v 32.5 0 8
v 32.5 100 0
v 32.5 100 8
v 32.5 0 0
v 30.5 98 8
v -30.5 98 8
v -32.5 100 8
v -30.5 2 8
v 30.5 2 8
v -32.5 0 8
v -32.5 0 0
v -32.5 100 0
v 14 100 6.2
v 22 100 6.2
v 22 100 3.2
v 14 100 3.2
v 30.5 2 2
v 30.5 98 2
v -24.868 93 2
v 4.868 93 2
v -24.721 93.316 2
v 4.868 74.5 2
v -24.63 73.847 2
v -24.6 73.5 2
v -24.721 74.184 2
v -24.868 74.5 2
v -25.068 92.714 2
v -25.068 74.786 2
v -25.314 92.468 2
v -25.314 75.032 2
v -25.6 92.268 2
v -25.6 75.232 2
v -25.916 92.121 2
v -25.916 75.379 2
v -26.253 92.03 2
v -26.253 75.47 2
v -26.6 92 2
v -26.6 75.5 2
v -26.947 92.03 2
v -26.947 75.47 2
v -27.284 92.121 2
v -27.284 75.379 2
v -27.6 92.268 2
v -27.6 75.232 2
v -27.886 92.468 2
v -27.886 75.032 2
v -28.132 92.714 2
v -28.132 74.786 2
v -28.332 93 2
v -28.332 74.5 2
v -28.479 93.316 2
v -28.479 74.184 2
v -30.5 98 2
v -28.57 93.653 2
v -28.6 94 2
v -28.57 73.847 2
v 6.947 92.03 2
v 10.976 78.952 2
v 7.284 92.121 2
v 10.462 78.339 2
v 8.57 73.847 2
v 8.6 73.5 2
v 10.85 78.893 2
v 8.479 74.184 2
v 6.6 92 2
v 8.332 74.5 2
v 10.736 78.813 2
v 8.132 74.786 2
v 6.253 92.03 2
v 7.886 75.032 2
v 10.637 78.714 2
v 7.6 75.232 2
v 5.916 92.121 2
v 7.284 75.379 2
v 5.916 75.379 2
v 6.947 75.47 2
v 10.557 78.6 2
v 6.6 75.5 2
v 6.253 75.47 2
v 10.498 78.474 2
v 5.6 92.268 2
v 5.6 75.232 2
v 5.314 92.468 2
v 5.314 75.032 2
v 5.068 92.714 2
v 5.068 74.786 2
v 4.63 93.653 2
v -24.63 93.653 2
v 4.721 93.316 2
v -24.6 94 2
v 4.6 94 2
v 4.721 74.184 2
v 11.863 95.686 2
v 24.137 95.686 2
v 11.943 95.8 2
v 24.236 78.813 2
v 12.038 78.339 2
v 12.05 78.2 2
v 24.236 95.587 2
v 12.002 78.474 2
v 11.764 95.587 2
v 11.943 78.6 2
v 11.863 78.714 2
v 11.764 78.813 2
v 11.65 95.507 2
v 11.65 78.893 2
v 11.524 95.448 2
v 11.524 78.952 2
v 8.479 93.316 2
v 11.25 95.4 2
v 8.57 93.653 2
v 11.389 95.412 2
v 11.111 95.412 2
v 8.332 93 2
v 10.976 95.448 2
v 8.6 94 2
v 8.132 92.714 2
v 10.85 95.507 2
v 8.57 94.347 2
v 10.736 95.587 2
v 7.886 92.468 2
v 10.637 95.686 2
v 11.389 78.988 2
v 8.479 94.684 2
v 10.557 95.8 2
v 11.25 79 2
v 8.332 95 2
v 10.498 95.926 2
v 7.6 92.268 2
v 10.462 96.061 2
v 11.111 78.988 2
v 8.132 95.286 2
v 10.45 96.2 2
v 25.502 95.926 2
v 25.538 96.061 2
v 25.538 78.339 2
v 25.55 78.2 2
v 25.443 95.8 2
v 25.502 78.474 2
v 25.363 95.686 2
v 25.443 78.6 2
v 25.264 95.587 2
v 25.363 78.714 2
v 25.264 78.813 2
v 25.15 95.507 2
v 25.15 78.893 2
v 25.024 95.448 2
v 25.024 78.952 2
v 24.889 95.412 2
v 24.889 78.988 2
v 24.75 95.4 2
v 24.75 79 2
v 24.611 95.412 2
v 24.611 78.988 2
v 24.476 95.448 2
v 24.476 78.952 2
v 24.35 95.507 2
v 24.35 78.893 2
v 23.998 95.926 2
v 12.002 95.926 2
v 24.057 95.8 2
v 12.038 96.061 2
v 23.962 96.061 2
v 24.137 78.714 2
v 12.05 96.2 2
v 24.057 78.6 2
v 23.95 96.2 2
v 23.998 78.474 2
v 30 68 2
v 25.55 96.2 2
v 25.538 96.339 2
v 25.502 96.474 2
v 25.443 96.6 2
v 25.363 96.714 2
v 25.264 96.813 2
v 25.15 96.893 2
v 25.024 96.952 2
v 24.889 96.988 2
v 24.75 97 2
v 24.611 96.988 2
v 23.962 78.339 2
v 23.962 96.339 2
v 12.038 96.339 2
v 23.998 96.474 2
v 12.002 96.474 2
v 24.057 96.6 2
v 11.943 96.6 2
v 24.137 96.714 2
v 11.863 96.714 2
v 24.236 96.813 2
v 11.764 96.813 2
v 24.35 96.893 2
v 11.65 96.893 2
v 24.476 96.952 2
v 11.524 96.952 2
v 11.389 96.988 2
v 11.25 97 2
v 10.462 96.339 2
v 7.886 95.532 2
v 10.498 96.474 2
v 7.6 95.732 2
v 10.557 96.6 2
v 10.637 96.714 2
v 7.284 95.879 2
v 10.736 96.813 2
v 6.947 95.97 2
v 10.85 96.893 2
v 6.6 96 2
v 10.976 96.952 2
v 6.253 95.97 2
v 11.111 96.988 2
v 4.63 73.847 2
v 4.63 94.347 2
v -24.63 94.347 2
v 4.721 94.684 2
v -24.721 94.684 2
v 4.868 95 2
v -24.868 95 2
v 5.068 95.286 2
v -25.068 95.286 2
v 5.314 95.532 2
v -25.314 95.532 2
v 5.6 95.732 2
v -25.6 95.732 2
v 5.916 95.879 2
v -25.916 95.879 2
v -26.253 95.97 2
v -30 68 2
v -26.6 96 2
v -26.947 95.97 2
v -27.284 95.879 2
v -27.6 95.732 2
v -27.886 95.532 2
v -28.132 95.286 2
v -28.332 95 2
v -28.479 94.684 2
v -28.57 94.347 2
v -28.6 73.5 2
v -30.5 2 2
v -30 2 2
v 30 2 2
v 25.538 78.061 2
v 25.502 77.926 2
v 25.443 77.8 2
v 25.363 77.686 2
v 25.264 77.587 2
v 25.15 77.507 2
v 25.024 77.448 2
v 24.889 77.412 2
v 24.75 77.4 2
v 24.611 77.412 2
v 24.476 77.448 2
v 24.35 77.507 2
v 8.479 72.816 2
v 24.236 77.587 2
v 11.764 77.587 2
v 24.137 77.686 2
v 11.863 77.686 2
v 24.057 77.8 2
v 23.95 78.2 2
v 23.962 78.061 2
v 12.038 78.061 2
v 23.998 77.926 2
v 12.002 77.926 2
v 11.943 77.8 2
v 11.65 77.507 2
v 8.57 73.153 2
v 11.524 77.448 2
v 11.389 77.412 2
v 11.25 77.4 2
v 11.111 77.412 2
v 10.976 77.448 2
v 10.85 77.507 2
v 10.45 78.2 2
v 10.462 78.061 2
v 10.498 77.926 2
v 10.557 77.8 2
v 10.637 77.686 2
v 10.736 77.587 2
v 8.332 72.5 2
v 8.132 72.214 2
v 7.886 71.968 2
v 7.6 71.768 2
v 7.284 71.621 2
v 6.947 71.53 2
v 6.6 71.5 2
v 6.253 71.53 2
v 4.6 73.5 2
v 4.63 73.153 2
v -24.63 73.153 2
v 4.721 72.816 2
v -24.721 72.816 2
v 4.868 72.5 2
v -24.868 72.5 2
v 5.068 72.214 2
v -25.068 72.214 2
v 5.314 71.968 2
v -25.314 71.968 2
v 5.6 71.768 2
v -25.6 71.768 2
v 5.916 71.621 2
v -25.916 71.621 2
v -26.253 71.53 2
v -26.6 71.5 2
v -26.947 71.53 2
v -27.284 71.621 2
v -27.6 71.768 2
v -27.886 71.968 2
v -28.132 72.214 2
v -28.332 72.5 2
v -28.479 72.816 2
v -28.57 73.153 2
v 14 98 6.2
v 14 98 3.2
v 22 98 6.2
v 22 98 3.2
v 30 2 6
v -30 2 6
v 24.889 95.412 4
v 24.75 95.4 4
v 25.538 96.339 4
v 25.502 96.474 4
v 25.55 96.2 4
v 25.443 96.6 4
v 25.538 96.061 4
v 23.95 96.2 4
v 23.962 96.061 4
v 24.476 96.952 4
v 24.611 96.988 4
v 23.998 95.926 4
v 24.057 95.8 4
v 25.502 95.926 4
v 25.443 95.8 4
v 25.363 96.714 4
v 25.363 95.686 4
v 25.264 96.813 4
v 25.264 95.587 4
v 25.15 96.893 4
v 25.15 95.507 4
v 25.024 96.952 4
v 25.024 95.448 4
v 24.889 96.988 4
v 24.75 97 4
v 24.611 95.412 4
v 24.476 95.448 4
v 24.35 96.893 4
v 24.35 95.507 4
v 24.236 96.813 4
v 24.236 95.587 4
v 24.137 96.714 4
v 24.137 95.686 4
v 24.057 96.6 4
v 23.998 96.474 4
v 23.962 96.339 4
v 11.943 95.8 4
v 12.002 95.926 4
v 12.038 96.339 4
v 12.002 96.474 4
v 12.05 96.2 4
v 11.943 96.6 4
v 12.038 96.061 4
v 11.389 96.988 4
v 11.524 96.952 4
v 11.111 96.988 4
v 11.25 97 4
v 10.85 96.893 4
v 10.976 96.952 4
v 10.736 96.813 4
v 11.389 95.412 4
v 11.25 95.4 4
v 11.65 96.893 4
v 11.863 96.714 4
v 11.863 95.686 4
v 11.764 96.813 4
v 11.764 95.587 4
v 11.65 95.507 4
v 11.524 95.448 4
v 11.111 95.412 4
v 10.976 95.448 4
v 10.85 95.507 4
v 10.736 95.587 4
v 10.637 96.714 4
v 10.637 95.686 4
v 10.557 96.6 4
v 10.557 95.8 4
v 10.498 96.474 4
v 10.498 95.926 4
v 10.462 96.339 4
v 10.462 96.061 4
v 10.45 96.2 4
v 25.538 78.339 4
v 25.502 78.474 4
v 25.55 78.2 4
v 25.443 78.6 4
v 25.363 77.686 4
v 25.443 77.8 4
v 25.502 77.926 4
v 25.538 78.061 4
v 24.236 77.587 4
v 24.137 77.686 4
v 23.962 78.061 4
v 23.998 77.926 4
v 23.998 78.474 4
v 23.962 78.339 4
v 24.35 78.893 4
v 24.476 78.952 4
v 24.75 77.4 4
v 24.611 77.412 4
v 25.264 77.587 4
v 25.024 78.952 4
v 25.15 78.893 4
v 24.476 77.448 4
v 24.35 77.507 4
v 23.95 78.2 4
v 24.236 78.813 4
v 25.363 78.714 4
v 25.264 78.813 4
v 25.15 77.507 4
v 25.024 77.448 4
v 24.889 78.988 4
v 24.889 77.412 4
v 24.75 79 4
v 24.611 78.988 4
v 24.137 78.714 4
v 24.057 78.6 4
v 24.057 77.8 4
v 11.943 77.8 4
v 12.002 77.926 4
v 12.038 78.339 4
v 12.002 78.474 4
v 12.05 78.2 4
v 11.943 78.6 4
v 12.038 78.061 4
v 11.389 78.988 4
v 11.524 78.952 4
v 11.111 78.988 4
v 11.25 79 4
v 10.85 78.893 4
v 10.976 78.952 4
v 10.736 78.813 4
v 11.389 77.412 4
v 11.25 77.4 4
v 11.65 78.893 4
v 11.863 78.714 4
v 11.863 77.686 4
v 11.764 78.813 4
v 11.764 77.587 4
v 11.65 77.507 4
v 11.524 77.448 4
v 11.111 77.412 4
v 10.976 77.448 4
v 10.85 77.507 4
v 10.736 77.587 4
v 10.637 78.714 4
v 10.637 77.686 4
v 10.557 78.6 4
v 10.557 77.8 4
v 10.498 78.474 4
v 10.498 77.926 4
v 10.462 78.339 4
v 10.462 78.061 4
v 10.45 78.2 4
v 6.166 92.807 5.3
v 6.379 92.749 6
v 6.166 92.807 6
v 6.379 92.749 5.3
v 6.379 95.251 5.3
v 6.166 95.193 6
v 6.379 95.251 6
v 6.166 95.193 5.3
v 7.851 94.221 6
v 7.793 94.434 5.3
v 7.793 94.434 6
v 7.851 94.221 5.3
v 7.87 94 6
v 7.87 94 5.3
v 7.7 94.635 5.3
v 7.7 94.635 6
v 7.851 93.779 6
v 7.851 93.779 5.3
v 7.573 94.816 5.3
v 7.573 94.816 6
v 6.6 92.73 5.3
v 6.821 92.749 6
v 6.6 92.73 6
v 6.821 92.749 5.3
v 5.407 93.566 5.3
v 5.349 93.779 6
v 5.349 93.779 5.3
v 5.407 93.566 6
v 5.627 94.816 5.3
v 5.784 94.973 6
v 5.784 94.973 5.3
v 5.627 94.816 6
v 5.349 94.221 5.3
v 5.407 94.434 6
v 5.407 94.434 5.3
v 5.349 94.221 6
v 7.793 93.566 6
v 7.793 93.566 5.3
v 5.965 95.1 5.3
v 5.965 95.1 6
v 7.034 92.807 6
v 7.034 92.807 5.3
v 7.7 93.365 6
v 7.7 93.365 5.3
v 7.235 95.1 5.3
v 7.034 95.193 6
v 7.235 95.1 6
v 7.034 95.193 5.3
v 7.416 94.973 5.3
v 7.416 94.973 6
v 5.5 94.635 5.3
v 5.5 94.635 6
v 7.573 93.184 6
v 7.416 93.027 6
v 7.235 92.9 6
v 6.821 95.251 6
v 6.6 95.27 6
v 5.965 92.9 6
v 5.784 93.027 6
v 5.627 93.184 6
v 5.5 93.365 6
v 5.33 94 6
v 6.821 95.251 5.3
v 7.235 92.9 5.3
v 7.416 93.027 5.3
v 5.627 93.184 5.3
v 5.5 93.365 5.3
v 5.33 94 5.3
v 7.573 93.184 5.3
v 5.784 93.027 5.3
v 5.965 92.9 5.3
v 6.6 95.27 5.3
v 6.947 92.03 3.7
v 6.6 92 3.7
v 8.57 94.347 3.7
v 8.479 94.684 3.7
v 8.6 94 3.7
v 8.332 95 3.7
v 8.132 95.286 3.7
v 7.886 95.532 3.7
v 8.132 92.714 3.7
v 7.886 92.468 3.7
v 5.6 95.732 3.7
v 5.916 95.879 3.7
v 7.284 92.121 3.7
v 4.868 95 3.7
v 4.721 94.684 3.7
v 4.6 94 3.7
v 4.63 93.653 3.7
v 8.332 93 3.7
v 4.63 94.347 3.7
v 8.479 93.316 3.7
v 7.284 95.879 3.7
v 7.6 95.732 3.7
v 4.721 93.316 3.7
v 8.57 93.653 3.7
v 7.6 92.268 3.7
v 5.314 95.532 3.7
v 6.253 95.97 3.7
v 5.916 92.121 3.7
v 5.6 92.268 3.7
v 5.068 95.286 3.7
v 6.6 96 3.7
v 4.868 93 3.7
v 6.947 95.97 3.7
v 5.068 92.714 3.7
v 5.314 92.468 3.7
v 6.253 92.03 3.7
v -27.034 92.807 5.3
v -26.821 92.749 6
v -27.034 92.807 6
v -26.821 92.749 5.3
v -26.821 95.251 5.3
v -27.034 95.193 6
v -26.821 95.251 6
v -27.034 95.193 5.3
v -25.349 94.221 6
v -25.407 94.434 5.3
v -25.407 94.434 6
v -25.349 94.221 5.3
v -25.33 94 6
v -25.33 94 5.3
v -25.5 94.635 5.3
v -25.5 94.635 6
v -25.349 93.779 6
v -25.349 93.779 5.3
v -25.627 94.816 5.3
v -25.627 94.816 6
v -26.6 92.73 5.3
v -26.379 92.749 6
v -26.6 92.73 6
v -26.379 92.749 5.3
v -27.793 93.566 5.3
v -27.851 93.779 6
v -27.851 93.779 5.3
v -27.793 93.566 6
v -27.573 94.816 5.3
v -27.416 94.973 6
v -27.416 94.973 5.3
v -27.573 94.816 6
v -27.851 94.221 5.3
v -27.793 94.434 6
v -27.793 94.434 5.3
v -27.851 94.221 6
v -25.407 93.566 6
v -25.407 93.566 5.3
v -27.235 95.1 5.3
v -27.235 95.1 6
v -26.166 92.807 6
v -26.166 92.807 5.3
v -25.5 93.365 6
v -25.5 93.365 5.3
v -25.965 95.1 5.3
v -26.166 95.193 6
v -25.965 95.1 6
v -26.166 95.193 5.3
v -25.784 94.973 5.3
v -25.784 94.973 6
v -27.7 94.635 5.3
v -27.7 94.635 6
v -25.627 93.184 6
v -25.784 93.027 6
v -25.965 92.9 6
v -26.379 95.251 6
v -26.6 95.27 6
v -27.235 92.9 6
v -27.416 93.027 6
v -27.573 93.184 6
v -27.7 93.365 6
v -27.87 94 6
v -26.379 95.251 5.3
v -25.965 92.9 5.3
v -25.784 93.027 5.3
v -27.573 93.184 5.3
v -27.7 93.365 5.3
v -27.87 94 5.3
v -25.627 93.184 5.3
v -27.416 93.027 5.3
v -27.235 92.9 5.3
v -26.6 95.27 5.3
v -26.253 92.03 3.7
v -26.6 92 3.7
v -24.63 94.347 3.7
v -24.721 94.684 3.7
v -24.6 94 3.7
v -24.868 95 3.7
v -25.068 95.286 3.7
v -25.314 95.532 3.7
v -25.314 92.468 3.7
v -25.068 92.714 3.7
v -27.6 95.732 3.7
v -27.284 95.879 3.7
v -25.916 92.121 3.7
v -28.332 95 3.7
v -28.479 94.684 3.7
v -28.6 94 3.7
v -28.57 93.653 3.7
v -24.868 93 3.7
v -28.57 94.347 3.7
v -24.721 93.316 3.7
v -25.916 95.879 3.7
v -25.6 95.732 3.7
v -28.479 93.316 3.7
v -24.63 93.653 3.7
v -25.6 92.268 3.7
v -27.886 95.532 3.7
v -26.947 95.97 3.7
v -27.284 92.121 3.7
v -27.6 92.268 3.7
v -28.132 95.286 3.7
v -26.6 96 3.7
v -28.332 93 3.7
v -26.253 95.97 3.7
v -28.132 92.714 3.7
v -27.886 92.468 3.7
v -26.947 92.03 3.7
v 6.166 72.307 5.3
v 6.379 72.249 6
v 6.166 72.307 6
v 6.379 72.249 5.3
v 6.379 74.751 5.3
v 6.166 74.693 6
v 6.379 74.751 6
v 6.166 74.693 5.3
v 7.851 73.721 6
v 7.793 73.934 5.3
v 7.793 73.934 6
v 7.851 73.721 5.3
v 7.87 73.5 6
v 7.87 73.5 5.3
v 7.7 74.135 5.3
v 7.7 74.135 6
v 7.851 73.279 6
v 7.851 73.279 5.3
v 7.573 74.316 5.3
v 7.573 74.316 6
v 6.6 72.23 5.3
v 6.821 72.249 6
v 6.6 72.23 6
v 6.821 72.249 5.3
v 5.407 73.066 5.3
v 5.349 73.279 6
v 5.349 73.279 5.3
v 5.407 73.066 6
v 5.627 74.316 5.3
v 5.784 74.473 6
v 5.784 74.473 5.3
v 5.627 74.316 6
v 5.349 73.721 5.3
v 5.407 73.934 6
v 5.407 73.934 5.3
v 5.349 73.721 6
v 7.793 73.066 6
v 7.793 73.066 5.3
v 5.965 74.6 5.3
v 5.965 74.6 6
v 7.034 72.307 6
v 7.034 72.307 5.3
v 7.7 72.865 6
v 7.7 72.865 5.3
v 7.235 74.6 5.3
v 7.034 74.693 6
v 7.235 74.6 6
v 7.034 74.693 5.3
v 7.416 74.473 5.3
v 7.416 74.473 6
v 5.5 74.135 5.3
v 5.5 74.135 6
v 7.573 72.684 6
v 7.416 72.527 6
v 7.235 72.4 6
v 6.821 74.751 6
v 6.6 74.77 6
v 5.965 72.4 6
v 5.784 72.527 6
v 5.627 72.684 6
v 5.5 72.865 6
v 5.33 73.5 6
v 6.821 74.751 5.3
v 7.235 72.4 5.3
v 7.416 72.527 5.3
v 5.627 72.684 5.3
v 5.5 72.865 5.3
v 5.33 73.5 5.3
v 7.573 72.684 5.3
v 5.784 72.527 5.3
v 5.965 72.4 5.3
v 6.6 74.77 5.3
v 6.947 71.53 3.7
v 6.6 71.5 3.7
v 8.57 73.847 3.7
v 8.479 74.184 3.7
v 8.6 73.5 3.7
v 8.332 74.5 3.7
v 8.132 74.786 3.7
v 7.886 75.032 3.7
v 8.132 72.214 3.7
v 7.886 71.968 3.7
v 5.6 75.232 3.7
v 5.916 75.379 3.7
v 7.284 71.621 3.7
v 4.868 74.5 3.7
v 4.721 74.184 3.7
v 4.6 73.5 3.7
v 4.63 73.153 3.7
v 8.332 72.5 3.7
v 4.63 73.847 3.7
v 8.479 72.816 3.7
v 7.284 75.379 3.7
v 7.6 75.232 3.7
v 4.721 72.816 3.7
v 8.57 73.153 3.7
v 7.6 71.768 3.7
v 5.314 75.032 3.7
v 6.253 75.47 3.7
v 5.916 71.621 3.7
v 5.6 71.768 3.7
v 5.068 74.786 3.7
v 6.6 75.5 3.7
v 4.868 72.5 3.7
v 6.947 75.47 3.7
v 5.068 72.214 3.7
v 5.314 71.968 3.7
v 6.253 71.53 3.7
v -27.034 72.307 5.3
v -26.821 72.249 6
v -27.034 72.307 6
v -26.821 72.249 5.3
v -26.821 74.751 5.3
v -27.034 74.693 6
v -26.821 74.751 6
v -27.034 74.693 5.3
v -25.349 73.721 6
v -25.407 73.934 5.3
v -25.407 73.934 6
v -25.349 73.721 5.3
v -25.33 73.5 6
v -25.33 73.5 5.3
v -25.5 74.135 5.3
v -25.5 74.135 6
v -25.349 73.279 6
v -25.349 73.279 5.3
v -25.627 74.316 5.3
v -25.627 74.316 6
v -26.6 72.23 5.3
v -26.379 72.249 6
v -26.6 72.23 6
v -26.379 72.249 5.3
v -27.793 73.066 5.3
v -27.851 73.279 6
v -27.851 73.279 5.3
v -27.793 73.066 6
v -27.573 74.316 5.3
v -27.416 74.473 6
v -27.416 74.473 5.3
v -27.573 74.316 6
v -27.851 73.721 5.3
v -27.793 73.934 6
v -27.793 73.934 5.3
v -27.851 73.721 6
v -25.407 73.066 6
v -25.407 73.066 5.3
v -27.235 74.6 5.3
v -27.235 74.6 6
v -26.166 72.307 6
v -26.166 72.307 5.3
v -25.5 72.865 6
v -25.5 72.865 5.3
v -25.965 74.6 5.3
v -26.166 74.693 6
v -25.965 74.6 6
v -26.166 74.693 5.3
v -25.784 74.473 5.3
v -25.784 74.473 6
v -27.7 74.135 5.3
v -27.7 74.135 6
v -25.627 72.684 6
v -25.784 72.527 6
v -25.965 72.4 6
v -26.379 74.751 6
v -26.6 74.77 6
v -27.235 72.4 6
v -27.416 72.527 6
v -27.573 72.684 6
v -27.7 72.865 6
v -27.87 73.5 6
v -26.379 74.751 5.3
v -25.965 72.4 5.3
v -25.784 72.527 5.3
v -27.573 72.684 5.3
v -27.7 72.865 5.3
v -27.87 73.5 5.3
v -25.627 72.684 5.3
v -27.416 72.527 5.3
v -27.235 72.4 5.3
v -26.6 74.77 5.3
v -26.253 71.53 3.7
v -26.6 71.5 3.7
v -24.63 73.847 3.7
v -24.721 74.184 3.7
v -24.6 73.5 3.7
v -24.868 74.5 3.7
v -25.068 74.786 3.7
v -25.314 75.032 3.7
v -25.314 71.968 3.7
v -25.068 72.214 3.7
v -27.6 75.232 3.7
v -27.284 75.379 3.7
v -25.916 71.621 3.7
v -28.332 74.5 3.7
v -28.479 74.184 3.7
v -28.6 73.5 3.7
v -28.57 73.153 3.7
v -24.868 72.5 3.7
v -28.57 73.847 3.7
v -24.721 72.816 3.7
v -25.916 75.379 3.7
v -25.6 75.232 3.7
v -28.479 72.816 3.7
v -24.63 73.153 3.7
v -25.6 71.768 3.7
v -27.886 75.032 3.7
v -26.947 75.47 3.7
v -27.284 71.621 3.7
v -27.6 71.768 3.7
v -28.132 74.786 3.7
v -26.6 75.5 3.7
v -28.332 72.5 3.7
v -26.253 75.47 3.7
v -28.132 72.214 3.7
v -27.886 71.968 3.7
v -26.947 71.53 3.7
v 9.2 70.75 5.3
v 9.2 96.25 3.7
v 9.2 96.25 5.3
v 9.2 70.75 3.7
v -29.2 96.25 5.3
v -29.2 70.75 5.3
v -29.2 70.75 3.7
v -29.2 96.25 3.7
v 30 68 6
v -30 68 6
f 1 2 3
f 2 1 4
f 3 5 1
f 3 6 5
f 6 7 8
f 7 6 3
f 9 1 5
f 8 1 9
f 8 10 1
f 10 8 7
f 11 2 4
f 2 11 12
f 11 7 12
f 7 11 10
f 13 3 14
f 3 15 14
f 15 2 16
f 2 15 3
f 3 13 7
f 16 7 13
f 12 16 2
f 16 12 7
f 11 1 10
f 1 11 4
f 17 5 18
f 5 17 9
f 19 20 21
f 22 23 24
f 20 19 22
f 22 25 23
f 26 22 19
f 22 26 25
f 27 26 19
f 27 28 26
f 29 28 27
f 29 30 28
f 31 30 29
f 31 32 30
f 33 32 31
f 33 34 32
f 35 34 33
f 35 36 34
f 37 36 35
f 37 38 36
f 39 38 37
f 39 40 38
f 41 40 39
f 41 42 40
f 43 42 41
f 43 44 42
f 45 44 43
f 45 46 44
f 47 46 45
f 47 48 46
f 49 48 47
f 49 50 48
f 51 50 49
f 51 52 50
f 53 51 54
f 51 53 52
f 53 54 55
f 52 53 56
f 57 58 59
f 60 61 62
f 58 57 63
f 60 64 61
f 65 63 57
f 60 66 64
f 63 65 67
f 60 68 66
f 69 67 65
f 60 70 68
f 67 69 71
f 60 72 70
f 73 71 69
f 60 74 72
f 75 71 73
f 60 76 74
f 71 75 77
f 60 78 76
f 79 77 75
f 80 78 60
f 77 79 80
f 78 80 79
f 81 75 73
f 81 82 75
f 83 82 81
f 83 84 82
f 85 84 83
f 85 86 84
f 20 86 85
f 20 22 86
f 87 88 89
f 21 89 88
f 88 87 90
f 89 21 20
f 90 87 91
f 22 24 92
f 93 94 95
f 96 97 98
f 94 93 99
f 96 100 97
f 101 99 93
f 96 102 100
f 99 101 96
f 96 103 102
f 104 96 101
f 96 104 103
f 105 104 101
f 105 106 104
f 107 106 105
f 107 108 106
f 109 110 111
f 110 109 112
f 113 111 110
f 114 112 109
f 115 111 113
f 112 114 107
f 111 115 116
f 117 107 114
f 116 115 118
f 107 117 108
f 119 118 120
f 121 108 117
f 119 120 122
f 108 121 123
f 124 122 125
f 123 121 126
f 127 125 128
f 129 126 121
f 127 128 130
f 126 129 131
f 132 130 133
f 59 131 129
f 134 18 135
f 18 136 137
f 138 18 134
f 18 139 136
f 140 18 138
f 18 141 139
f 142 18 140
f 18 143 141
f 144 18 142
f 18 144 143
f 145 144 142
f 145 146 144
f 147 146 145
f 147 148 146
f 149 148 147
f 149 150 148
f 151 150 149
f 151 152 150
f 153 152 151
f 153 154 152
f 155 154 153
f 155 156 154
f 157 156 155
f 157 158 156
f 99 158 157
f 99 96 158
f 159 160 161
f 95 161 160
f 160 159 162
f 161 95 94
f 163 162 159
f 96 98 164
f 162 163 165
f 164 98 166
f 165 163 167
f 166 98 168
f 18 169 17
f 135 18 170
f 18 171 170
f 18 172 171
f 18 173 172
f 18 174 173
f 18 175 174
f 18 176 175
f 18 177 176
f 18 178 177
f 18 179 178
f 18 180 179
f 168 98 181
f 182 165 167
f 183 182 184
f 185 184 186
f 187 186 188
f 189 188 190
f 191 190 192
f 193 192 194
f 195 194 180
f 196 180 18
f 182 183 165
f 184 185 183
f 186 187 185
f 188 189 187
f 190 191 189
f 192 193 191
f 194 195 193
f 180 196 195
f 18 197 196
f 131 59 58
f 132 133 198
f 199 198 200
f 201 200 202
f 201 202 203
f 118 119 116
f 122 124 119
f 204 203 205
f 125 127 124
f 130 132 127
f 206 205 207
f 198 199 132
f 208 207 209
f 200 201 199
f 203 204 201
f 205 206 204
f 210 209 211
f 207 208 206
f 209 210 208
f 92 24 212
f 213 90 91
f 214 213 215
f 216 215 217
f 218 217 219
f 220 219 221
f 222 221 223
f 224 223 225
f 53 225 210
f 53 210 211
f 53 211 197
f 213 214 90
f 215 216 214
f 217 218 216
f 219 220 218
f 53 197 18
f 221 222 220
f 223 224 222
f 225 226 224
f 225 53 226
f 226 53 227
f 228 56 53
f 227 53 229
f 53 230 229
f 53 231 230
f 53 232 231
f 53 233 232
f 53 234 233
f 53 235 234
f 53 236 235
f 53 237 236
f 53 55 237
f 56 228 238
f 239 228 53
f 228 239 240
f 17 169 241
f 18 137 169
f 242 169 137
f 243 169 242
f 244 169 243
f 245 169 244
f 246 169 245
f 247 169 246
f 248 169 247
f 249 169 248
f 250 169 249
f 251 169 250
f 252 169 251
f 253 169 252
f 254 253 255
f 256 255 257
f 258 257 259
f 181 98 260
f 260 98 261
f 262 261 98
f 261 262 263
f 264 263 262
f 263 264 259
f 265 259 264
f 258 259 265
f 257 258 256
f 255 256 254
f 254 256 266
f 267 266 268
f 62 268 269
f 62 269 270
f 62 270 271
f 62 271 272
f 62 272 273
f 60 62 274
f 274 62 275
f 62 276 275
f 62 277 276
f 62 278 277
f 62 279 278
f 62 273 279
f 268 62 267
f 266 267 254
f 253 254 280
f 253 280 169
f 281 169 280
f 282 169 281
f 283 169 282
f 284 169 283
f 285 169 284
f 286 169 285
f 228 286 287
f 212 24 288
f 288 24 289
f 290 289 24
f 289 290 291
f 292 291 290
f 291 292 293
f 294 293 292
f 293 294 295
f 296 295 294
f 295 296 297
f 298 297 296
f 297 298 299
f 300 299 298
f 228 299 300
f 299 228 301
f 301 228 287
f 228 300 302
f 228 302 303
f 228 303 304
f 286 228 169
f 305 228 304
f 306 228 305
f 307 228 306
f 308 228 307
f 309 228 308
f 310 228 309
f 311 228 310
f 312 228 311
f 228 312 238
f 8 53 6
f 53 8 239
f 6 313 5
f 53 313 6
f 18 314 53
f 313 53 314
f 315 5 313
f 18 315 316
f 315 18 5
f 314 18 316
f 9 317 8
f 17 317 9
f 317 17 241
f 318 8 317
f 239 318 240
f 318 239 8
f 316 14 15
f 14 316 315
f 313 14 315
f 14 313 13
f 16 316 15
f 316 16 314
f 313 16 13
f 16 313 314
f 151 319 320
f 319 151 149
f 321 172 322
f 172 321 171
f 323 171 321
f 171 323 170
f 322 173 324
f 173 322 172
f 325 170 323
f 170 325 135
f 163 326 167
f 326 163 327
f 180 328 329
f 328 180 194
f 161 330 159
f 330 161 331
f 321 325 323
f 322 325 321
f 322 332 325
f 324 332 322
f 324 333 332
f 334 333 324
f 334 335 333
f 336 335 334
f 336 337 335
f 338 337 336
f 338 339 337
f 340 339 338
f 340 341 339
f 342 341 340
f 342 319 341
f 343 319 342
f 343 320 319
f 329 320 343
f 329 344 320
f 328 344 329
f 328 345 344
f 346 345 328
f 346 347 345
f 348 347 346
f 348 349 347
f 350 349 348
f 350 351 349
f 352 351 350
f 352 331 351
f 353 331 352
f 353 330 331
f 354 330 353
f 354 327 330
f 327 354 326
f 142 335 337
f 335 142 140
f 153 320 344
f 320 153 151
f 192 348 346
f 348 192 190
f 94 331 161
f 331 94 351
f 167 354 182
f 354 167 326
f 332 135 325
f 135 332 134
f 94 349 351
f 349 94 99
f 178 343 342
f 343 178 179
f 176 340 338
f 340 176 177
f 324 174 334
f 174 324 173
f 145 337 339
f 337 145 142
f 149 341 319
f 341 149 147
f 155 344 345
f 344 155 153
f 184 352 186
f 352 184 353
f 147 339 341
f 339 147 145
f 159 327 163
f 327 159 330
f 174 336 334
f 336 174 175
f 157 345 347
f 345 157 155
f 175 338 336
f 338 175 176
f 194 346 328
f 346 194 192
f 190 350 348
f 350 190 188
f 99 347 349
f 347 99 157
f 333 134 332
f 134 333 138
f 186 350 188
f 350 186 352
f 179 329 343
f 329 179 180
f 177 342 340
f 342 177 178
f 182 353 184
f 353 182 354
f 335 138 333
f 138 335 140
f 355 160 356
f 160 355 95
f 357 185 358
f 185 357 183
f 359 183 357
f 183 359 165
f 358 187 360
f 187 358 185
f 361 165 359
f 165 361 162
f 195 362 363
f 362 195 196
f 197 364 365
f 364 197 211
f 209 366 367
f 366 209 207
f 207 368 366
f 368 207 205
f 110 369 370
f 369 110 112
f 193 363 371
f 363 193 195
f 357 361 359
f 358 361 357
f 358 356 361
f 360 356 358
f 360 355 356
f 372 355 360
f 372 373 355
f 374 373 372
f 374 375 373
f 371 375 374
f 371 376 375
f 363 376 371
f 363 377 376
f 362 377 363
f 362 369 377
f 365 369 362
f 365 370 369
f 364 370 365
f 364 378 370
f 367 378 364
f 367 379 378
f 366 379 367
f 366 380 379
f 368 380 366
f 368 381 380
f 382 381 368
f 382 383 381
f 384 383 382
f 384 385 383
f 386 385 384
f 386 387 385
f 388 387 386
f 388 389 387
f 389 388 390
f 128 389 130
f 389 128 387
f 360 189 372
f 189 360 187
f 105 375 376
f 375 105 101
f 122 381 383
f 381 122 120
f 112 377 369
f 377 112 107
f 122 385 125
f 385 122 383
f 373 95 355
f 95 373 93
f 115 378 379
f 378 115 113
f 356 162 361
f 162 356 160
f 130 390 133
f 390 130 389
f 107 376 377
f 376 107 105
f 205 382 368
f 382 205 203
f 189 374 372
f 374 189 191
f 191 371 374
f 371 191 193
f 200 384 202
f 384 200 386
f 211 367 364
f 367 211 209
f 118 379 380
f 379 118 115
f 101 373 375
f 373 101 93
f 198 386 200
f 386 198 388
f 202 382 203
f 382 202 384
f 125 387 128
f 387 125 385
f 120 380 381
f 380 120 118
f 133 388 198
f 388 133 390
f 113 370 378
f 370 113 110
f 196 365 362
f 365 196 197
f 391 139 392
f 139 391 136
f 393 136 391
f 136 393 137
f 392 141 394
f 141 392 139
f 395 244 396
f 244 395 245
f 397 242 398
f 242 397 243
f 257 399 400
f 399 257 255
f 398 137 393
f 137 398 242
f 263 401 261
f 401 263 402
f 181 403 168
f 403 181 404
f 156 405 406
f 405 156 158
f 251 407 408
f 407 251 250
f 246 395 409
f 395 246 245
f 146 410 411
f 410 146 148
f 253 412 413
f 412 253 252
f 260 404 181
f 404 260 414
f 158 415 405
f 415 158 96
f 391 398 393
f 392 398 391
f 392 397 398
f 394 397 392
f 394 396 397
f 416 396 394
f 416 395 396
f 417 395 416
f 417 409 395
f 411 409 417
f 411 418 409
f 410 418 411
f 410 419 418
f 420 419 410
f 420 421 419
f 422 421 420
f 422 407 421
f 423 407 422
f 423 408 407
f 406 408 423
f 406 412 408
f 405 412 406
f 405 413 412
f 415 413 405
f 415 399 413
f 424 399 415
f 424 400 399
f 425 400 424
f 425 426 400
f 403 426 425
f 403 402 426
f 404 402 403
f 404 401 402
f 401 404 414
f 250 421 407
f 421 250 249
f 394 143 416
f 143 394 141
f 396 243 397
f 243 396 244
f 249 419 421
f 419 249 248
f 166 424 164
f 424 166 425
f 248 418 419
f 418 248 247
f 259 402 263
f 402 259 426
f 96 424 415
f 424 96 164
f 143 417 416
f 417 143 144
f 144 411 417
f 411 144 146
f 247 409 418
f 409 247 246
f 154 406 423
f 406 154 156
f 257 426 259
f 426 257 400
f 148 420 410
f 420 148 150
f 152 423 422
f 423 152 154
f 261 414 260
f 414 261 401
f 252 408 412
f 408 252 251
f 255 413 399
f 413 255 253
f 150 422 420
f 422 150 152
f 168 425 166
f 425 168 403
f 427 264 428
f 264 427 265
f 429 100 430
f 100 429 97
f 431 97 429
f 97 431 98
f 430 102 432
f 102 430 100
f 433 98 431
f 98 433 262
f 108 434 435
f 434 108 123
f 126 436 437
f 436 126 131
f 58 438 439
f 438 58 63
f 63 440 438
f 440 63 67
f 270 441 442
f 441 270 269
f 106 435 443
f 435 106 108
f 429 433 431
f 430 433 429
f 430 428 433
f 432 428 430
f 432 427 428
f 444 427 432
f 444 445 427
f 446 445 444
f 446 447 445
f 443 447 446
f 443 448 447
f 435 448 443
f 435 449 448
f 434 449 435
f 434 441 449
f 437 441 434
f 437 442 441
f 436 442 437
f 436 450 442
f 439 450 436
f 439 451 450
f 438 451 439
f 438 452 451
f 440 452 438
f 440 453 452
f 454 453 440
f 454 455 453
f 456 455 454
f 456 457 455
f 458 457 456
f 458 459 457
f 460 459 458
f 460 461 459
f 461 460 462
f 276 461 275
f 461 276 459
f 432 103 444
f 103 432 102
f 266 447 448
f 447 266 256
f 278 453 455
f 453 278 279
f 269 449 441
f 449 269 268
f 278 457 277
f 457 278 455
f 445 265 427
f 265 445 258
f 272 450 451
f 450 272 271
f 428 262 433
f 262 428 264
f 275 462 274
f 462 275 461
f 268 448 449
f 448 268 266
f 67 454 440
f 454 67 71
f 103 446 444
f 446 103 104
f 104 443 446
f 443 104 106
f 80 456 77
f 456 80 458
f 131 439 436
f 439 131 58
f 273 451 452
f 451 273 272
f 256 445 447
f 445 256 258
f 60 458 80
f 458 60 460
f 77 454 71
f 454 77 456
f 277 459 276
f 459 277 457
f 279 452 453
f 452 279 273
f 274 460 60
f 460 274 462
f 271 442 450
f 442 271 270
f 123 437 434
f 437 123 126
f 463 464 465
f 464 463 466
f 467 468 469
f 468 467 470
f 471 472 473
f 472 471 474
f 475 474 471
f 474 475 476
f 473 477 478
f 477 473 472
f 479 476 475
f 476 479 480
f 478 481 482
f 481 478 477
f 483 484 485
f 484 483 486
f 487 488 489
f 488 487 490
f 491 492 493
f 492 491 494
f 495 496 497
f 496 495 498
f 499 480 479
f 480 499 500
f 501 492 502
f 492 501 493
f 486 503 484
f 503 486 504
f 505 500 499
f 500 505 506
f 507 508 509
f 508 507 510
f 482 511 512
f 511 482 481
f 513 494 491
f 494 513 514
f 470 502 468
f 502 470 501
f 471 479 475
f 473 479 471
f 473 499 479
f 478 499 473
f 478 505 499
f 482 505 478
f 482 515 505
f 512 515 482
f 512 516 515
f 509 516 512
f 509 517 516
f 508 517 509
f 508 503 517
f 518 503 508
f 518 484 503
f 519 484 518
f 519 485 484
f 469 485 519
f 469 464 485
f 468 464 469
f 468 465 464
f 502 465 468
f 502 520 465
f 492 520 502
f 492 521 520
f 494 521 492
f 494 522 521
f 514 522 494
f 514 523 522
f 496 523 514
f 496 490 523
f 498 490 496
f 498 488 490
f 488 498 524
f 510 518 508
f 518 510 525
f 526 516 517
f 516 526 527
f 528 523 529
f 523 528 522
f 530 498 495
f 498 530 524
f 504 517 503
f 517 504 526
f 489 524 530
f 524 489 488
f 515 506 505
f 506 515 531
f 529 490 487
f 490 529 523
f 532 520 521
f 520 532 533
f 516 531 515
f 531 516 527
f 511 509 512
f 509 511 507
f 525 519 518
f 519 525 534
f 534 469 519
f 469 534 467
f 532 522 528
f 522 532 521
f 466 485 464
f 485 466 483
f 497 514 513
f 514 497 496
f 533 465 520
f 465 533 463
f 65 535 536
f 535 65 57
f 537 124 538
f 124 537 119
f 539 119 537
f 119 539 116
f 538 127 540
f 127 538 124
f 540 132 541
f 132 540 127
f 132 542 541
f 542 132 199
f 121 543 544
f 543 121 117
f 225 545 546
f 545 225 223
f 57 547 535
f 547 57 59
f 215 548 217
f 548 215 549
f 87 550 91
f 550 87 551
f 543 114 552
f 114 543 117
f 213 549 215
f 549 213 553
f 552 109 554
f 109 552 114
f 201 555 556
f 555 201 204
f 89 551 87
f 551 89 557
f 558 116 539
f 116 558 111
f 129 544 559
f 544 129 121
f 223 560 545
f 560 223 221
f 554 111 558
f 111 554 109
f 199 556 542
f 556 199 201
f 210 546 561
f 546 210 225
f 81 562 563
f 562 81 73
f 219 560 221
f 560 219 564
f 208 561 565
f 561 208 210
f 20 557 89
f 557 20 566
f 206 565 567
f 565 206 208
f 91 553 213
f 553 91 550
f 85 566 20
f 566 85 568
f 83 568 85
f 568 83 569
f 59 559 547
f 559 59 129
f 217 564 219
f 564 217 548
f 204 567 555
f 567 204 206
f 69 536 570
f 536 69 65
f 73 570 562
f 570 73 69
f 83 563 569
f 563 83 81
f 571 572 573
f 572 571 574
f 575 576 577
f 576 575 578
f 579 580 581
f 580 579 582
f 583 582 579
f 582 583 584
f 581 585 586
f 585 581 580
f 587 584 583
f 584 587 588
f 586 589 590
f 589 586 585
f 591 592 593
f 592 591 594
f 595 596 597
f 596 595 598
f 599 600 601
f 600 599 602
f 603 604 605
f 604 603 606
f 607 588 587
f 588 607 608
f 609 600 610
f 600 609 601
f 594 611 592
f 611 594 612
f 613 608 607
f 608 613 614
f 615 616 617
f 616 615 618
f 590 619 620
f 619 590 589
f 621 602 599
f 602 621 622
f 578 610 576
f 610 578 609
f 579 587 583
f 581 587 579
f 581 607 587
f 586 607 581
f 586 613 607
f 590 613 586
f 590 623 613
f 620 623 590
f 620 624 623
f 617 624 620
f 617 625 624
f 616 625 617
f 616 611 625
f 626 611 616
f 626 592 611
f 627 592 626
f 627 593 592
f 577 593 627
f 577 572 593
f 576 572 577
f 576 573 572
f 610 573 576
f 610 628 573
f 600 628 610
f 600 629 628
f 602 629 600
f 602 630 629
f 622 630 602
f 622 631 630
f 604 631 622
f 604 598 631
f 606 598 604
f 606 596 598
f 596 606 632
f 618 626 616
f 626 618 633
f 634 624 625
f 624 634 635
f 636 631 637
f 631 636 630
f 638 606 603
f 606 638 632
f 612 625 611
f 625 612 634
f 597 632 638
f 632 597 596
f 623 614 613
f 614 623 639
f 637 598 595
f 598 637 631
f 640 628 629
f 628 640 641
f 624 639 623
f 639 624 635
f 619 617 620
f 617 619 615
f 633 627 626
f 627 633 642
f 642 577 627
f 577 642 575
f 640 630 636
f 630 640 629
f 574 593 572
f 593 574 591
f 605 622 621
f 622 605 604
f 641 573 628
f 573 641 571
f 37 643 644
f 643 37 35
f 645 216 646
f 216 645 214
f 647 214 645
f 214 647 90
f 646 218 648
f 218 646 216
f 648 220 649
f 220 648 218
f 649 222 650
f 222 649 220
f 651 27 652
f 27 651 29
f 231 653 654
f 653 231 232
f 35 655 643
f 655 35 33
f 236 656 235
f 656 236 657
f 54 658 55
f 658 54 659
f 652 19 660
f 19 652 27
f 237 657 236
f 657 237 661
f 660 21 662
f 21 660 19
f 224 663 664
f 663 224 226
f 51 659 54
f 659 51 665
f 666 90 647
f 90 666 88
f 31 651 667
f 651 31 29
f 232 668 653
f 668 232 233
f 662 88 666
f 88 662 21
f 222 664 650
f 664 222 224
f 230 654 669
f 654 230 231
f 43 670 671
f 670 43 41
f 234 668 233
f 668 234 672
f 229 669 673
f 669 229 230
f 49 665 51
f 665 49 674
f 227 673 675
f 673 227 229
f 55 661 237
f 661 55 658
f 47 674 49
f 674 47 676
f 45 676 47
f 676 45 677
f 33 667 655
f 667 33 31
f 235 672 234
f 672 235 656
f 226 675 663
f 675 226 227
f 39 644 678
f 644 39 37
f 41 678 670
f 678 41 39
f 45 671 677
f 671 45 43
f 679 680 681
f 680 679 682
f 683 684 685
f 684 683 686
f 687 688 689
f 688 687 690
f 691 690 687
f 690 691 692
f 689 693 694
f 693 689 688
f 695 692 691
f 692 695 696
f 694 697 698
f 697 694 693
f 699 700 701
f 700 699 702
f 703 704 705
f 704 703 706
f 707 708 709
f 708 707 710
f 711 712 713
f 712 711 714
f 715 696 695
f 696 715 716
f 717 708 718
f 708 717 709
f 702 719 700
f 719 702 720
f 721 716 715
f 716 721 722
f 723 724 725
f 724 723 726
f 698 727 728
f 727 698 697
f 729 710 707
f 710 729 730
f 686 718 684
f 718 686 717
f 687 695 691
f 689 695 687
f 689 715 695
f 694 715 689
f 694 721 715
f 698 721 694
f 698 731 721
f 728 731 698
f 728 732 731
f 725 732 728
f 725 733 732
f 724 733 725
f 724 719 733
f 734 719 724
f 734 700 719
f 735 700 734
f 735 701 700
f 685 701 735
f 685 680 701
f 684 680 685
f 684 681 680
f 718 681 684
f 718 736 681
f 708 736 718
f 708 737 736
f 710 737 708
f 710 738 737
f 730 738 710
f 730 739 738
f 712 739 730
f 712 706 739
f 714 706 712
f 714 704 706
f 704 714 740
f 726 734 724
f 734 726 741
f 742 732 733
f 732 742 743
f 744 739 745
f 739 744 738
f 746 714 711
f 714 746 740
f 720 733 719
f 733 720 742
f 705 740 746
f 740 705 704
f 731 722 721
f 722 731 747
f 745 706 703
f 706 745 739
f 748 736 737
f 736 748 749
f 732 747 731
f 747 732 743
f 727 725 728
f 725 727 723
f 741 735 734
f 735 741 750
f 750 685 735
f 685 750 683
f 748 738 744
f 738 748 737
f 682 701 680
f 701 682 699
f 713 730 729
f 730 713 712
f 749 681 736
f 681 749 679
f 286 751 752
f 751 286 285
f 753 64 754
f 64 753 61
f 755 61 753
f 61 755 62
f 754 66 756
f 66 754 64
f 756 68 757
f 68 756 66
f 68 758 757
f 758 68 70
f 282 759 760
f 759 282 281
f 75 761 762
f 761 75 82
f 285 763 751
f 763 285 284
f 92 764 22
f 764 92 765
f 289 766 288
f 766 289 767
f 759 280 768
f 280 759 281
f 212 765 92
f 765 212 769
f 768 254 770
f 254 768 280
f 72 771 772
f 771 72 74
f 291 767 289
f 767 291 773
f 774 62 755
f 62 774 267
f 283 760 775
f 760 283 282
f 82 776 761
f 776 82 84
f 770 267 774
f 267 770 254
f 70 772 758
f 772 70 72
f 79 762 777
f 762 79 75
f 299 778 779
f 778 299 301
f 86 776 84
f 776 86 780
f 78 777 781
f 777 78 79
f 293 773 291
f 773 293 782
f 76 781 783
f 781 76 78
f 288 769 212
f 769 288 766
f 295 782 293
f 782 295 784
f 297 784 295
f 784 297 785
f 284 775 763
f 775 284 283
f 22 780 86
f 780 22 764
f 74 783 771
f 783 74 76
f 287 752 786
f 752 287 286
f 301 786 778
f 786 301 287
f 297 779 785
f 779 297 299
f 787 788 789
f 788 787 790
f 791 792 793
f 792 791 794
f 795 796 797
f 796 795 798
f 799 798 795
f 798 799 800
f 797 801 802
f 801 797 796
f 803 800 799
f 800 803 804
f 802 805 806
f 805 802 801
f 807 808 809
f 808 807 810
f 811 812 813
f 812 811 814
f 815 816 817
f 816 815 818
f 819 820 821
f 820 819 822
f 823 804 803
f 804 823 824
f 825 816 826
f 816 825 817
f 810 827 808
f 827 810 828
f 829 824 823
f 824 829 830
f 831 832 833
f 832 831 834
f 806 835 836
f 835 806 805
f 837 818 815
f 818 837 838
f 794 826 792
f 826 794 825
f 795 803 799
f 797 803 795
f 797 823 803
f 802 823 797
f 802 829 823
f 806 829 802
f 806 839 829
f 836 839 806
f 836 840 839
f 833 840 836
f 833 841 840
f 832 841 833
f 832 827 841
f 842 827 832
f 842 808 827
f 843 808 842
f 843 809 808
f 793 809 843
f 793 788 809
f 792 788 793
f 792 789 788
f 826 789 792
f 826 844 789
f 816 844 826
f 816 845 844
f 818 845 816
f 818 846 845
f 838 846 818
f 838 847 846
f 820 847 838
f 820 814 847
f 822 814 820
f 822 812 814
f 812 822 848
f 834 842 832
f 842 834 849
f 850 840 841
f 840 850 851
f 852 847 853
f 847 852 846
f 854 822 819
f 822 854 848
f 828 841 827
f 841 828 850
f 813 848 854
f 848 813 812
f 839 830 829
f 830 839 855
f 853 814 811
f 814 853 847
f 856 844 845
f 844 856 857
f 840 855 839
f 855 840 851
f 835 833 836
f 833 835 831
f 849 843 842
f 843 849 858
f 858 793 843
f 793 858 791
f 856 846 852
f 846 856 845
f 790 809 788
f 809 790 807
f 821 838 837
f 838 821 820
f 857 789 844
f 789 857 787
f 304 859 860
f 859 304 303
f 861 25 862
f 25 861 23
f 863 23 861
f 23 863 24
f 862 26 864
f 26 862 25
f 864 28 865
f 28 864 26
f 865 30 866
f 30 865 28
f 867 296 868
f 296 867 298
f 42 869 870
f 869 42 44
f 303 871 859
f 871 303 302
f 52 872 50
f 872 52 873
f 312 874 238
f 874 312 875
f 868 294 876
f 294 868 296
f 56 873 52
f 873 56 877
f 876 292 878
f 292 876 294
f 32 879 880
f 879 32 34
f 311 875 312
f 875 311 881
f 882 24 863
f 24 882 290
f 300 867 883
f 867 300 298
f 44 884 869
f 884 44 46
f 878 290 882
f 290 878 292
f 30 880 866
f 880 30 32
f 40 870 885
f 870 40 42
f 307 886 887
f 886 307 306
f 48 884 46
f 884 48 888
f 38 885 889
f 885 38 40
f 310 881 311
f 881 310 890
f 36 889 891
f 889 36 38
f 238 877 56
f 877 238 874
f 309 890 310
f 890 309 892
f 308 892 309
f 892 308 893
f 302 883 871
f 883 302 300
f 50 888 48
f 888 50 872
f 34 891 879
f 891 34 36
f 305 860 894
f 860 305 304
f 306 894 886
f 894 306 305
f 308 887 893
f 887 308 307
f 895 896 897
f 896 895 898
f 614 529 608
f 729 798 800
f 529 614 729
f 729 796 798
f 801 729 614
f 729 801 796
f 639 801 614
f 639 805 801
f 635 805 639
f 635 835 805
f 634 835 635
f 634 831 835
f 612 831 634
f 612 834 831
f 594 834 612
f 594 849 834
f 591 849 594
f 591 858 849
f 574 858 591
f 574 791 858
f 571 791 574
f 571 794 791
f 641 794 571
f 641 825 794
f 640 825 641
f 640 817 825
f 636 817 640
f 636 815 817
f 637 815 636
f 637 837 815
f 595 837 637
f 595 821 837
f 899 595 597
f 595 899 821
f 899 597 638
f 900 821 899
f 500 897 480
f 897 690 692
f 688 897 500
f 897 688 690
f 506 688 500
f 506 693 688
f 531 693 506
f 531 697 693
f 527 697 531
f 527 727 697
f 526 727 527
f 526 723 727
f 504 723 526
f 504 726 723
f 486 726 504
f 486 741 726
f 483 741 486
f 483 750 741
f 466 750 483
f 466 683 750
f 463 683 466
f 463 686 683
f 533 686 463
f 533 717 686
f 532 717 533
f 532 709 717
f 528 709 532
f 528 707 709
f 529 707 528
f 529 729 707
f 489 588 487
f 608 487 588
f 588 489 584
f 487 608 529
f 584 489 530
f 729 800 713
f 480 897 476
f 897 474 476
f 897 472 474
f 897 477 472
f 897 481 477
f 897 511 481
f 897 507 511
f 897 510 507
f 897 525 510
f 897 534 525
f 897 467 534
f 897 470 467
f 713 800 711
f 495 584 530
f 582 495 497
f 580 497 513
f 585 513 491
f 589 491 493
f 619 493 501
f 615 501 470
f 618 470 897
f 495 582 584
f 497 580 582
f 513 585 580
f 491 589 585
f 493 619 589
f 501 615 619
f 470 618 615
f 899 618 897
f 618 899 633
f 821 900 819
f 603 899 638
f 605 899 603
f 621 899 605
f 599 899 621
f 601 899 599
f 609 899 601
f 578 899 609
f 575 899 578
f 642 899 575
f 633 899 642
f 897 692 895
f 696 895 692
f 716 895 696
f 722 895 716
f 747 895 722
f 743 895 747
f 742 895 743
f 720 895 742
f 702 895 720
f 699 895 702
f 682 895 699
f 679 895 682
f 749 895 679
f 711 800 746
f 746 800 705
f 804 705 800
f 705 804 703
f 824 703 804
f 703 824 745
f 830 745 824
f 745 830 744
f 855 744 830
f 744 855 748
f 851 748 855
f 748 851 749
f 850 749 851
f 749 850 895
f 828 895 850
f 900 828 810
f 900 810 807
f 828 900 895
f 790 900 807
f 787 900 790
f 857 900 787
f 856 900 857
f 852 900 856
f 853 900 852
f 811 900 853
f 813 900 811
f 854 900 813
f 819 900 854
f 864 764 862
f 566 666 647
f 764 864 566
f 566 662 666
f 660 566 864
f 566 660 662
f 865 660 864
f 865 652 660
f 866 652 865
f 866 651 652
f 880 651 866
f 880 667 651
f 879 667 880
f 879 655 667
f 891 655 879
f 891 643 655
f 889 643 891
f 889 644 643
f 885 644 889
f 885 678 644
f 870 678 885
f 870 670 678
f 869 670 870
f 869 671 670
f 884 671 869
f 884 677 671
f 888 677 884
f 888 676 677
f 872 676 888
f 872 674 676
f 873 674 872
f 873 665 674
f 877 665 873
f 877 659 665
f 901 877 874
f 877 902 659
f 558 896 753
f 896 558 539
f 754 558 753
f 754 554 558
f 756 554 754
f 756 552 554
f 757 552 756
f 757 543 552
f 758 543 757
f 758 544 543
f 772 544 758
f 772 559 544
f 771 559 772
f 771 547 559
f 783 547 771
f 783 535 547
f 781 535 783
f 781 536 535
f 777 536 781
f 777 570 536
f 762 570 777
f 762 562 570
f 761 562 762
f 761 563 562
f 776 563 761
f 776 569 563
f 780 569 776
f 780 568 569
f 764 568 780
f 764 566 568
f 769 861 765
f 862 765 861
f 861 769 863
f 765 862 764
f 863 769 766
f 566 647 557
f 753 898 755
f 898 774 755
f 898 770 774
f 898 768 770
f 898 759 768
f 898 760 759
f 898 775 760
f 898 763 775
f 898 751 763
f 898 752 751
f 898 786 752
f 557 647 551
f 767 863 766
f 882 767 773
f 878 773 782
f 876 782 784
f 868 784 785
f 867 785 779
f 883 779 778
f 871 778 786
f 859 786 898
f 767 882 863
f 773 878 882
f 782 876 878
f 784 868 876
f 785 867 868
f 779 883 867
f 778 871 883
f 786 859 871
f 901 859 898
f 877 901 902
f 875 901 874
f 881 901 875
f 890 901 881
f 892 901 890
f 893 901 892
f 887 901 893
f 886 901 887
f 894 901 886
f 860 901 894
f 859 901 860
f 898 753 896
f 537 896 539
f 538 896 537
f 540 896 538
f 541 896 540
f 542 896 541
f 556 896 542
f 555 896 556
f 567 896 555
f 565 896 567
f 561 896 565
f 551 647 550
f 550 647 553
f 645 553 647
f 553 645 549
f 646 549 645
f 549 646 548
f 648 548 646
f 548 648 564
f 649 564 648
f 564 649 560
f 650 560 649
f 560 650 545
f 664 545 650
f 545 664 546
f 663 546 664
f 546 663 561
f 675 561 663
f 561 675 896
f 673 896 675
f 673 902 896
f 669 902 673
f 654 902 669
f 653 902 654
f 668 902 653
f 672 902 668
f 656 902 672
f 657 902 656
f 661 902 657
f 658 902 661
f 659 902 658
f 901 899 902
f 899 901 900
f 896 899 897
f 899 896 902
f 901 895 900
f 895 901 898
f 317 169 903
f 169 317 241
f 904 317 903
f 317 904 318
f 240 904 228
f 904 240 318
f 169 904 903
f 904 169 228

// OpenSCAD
//PCB size: 47x24x1.6 mm
//charger board: 17.5x22
//holes: 13.5, 18
//USB: 8x3
//Battery: 21x32x7

$fn=36;

batt_x=60;
batt_y=66;
batt_z=4;

over_x=1; //Ennyivel lehet oldalrol ralogni a NYAK-ra
over_z=1.7; //Ennyivel lehet alulrol es felulrol ralogni a NYAK-ra
over2=2; // Ennyivel lesz szelesebb a doboz, mint a NYAK
base_x=65; //Doboz szelessege
base_y=100;
encl_thick=2; //Doboz anyaganak vastagsaga

usb_x=18; //USB tolto x offset
huzzah_x=-10; //Huzzah tolto x offset

module battery()
{
	translate([0, batt_y/2, batt_z/2])
		cube([batt_x, batt_y, batt_z], center=true);
}

//Lent, fent: 1.7mm, oldalt: 1mm

module usb()
{
  translate([usb_x-4, base_y-encl_thick-1, encl_thick+1.2]) cube([8, encl_thick+2, 3]);
}

//pcb();
//translate([-base_x/2, 0, 0]) cube([base_x, base_y, encl_thick]);
difference()
{
  translate([-base_x/2, 0, 0]) cube([base_x, base_y, 8]);
  translate([-base_x/2+encl_thick, encl_thick, encl_thick]) cube([base_x-encl_thick*2, base_y-encl_thick*2, 20]);
  usb();
}

module foo()
{
  cylinder(d=1.6, h=2, center=false);
}

module foo2()
{
  cylinder(d=2.54, h=4, center=false);
  cylinder(d=4, h=2, center=false);
}

translate([usb_x, base_y-1.8-encl_thick, encl_thick])
{
  translate([13.5/2, 0, 0]) foo();
  translate([-13.5/2, 0, 0]) foo();
  translate([13.5/2, -18, 0]) foo();
  translate([-13.5/2, -18, 0]) foo();
}

translate([huzzah_x, base_y-4-encl_thick, encl_thick])
{
  translate([33.2/2, 0, 0]) foo2();
  translate([-33.2/2, 0, 0]) foo2();
  translate([33.2/2, -20.5, 0]) foo2();
  translate([-33.2/2, -20.5, 0]) foo2();
	#translate([0, -10.5, 2.5]) cube([38.4, 25.5, 1.6], center=true);
}


#translate([0, 2, 2]) battery();
